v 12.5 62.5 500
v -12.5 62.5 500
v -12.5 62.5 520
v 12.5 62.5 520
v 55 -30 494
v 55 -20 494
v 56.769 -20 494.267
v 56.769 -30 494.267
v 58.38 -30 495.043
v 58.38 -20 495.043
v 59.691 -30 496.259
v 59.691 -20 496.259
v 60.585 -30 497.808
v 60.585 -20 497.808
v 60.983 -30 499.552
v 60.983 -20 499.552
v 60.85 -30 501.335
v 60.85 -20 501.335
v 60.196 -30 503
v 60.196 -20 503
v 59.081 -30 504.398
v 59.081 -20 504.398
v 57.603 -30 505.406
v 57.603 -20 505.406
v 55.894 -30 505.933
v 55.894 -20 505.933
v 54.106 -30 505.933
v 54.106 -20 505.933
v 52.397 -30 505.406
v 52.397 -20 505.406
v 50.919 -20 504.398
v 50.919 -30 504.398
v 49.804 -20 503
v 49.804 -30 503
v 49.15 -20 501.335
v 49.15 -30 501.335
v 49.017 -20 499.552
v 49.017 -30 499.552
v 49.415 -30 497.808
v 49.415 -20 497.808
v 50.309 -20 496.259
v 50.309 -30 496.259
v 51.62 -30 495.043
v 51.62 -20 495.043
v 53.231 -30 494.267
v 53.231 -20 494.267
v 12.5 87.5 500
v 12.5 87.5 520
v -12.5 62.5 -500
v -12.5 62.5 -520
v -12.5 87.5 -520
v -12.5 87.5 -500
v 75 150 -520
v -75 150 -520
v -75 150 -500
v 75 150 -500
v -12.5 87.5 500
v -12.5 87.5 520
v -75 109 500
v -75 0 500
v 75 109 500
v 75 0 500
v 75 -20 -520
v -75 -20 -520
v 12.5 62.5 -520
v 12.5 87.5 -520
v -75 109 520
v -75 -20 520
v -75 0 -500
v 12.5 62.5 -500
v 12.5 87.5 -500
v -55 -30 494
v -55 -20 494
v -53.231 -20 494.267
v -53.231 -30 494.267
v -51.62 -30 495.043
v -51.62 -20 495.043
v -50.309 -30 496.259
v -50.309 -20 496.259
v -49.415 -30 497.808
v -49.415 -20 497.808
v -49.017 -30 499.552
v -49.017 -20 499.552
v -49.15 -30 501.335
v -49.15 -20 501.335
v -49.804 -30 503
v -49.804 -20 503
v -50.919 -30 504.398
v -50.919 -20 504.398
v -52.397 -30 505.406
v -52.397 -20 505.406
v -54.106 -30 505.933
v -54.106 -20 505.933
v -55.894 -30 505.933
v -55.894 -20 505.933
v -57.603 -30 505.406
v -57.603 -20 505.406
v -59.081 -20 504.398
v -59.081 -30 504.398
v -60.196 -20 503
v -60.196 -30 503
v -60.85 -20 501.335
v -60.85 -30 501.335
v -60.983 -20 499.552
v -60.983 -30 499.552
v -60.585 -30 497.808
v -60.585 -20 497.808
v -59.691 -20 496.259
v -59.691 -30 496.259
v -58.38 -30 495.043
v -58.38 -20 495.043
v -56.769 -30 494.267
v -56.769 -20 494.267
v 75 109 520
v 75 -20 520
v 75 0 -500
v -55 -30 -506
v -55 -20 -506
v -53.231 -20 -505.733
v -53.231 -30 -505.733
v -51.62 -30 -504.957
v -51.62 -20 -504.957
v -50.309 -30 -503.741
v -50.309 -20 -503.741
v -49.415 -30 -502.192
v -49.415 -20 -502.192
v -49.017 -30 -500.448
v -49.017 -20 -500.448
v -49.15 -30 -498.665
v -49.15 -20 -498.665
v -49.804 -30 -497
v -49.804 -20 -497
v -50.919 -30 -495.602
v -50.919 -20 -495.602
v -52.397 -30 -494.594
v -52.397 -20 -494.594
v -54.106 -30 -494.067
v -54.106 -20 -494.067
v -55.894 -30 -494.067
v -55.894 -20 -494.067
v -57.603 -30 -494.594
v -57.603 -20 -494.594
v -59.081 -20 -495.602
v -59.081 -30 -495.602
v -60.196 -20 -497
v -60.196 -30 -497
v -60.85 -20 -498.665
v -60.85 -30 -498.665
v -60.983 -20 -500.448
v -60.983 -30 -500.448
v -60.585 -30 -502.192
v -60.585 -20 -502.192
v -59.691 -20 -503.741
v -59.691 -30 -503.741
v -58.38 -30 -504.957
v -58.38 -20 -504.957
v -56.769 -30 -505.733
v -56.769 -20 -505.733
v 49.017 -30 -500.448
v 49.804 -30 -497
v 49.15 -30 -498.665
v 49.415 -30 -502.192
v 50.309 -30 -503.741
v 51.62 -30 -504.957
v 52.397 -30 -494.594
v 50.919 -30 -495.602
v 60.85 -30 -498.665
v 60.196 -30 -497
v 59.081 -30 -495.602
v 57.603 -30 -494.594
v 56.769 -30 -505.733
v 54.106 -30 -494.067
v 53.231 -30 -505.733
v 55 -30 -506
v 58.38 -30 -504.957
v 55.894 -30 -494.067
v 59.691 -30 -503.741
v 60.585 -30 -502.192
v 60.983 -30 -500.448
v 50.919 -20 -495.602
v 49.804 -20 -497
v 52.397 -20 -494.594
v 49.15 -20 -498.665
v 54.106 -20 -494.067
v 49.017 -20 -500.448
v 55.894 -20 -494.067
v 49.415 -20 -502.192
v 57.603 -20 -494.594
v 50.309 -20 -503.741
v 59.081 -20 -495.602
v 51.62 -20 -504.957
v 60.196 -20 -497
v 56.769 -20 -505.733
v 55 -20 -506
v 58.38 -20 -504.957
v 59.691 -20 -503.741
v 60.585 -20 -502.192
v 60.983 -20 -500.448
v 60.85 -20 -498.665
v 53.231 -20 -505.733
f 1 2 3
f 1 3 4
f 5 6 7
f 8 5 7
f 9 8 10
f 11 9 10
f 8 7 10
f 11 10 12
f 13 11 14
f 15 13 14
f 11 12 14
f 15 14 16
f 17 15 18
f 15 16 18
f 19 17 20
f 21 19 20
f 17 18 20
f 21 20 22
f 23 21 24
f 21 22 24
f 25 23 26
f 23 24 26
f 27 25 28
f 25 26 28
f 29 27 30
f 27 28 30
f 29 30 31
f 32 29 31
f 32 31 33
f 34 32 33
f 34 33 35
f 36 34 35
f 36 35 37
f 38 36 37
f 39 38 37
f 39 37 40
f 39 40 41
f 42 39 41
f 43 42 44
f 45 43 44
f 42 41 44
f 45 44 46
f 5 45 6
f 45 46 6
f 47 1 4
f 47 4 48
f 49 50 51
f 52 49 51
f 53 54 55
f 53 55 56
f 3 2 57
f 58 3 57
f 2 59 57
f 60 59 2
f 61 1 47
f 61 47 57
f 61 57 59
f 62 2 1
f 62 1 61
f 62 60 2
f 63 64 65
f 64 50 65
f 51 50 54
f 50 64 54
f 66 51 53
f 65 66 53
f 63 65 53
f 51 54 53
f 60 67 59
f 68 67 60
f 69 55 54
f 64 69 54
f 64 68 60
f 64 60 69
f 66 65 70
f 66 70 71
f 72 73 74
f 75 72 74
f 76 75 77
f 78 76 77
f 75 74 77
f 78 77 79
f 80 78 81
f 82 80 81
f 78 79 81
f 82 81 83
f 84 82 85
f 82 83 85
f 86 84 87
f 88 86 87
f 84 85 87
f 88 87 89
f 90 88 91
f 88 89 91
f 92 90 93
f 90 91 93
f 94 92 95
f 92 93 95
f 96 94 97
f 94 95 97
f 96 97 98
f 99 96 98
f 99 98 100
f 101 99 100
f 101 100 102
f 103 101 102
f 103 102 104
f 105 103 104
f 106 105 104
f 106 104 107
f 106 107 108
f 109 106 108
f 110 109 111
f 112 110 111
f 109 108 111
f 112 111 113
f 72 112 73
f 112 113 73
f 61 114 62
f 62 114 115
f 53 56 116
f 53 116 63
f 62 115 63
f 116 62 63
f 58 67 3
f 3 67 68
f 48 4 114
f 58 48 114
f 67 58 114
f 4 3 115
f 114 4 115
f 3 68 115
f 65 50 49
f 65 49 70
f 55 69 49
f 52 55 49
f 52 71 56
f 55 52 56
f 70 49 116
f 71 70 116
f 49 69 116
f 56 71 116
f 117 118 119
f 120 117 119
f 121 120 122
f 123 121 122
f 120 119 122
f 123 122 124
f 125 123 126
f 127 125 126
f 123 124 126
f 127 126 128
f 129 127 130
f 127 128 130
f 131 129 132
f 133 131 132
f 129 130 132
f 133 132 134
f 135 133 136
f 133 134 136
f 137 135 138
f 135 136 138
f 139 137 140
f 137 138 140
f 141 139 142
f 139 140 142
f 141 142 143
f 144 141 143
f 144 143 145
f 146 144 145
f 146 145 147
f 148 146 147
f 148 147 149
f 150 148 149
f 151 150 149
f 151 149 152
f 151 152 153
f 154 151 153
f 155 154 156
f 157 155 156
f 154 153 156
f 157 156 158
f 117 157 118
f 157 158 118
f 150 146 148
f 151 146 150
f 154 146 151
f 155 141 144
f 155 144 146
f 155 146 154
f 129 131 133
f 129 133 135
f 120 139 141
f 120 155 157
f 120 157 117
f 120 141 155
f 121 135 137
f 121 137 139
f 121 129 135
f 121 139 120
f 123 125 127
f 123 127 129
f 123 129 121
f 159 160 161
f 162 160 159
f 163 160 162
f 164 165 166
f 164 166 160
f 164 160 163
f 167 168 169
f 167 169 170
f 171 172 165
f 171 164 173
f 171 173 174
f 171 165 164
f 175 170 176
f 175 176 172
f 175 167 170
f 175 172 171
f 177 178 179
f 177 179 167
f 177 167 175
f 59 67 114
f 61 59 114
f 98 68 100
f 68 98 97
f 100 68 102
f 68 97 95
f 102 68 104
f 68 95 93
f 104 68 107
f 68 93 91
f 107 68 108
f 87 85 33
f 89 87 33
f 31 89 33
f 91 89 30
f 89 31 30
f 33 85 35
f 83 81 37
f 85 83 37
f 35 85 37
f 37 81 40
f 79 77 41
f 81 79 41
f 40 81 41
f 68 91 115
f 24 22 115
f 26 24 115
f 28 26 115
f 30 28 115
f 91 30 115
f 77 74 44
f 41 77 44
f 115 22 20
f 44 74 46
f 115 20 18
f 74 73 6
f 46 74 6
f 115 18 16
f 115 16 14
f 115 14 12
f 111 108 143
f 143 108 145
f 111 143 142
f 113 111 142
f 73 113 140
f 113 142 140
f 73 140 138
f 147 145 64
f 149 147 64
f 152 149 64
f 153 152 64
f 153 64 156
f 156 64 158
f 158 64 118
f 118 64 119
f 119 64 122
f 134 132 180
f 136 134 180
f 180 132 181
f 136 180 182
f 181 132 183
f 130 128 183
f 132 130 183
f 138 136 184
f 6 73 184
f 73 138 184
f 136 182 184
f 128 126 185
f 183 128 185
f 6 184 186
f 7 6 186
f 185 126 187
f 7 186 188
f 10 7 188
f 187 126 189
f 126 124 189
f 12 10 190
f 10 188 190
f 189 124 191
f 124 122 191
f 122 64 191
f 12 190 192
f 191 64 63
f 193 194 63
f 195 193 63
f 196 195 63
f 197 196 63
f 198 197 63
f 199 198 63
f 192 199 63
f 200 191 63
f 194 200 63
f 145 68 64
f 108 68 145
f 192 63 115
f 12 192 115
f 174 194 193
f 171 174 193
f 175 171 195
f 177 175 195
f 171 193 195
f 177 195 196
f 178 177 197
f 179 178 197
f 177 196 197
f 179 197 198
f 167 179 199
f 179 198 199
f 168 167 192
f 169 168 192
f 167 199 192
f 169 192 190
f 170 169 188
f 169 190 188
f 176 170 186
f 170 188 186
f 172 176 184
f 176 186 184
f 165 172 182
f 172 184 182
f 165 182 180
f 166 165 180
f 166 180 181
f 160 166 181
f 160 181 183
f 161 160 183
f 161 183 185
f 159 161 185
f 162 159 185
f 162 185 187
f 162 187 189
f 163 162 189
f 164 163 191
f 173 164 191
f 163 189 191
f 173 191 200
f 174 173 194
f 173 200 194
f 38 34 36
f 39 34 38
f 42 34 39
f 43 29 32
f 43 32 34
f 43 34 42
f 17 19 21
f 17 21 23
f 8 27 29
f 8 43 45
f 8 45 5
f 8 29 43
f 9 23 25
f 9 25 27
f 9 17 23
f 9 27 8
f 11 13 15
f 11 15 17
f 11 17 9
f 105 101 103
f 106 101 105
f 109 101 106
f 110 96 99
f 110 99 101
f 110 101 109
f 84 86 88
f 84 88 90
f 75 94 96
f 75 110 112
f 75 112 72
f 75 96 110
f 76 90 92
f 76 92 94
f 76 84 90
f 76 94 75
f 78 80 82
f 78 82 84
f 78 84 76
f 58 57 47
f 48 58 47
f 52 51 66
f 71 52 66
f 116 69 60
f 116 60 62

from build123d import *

# Parameters (mm, degrees)
SKETCH2_W               = 150
SKETCH2_H               = 1040
BOSS_EXTRUDE1_DEPTH     = 20
SKETCH3_W               = 150
SKETCH3_H               = 20
BOSS_EXTRUDE2_DEPTH     = 150
CUT_EXTRUDE1_DEPTH      = 1054.434857977
CUT_EXTRUDE1_DEPTH_BACK = 1054.434857977
SKETCH4_W               = 25
SKETCH4_H               = 25
SKETCH5_R               = 6
BOSS_EXTRUDE3_DEPTH     = 10
CUT_EXTRUDE2_REACH      = 1055.435
SKETCH6_W               = 150
SKETCH6_H               = 41


with BuildPart() as part:
    # Sketch2 → Boss-Extrude1 (new body)
    with BuildSketch(Plane(origin=(0, 0, 0), x_dir=(1, 0, 0), z_dir=(0, 1, 0))):
        Rectangle(SKETCH2_W, SKETCH2_H)
    extrude(amount=-BOSS_EXTRUDE1_DEPTH)

    # Sketch3 → Boss-Extrude2 (add)
    with BuildSketch(Plane(origin=(0, 0, 0), x_dir=(1, 0, 0), z_dir=(0, 1, 0))):
        with Locations((0, -510)):
            Rectangle(SKETCH3_W, SKETCH3_H)
        with Locations((0, 510)):
            Rectangle(SKETCH3_W, SKETCH3_H)
    extrude(amount=BOSS_EXTRUDE2_DEPTH)

    # Sketch4 → Cut-Extrude1 (cut, two sides: drawn at the far end of the back side and taken through both)
    with BuildSketch(Plane.XY.offset(520).offset(-CUT_EXTRUDE1_DEPTH_BACK)):
        with Locations((0, 75)):
            Rectangle(SKETCH4_W, SKETCH4_H)
    extrude(amount=CUT_EXTRUDE1_DEPTH + CUT_EXTRUDE1_DEPTH_BACK, mode=Mode.SUBTRACT)

    # Sketch5 → Boss-Extrude3 (add)
    with BuildSketch(Plane.XZ.offset(20)):
        with Locations(Location((-55, 500, 0), (0, 0, 270))):
            Circle(SKETCH5_R)
        with Locations(Location((55, 500, 0), (0, 0, 270))):
            Circle(SKETCH5_R)
        with Locations(Location((-55, -500, 0), (0, 0, 270))):
            Circle(SKETCH5_R)
        with Locations(Location((55, -500, 0), (0, 0, 270))):
            Circle(SKETCH5_R)
    extrude(amount=BOSS_EXTRUDE3_DEPTH)

    # Sketch6 → Cut-Extrude2 (cut, up to next)
    with BuildSketch(Plane.XY.offset(520), mode=Mode.PRIVATE) as cut_extrude2_sk1:
        with Locations((0, 129.5)):
            Rectangle(SKETCH6_W, SKETCH6_H)
    cut_extrude2_tool1 = extrude(cut_extrude2_sk1.sketch, amount=-CUT_EXTRUDE2_REACH, mode=Mode.PRIVATE) & part.part
    add(cut_extrude2_tool1.solids().sort_by_distance((0, 129.5, 520))[0], mode=Mode.SUBTRACT)


solid = part.part
